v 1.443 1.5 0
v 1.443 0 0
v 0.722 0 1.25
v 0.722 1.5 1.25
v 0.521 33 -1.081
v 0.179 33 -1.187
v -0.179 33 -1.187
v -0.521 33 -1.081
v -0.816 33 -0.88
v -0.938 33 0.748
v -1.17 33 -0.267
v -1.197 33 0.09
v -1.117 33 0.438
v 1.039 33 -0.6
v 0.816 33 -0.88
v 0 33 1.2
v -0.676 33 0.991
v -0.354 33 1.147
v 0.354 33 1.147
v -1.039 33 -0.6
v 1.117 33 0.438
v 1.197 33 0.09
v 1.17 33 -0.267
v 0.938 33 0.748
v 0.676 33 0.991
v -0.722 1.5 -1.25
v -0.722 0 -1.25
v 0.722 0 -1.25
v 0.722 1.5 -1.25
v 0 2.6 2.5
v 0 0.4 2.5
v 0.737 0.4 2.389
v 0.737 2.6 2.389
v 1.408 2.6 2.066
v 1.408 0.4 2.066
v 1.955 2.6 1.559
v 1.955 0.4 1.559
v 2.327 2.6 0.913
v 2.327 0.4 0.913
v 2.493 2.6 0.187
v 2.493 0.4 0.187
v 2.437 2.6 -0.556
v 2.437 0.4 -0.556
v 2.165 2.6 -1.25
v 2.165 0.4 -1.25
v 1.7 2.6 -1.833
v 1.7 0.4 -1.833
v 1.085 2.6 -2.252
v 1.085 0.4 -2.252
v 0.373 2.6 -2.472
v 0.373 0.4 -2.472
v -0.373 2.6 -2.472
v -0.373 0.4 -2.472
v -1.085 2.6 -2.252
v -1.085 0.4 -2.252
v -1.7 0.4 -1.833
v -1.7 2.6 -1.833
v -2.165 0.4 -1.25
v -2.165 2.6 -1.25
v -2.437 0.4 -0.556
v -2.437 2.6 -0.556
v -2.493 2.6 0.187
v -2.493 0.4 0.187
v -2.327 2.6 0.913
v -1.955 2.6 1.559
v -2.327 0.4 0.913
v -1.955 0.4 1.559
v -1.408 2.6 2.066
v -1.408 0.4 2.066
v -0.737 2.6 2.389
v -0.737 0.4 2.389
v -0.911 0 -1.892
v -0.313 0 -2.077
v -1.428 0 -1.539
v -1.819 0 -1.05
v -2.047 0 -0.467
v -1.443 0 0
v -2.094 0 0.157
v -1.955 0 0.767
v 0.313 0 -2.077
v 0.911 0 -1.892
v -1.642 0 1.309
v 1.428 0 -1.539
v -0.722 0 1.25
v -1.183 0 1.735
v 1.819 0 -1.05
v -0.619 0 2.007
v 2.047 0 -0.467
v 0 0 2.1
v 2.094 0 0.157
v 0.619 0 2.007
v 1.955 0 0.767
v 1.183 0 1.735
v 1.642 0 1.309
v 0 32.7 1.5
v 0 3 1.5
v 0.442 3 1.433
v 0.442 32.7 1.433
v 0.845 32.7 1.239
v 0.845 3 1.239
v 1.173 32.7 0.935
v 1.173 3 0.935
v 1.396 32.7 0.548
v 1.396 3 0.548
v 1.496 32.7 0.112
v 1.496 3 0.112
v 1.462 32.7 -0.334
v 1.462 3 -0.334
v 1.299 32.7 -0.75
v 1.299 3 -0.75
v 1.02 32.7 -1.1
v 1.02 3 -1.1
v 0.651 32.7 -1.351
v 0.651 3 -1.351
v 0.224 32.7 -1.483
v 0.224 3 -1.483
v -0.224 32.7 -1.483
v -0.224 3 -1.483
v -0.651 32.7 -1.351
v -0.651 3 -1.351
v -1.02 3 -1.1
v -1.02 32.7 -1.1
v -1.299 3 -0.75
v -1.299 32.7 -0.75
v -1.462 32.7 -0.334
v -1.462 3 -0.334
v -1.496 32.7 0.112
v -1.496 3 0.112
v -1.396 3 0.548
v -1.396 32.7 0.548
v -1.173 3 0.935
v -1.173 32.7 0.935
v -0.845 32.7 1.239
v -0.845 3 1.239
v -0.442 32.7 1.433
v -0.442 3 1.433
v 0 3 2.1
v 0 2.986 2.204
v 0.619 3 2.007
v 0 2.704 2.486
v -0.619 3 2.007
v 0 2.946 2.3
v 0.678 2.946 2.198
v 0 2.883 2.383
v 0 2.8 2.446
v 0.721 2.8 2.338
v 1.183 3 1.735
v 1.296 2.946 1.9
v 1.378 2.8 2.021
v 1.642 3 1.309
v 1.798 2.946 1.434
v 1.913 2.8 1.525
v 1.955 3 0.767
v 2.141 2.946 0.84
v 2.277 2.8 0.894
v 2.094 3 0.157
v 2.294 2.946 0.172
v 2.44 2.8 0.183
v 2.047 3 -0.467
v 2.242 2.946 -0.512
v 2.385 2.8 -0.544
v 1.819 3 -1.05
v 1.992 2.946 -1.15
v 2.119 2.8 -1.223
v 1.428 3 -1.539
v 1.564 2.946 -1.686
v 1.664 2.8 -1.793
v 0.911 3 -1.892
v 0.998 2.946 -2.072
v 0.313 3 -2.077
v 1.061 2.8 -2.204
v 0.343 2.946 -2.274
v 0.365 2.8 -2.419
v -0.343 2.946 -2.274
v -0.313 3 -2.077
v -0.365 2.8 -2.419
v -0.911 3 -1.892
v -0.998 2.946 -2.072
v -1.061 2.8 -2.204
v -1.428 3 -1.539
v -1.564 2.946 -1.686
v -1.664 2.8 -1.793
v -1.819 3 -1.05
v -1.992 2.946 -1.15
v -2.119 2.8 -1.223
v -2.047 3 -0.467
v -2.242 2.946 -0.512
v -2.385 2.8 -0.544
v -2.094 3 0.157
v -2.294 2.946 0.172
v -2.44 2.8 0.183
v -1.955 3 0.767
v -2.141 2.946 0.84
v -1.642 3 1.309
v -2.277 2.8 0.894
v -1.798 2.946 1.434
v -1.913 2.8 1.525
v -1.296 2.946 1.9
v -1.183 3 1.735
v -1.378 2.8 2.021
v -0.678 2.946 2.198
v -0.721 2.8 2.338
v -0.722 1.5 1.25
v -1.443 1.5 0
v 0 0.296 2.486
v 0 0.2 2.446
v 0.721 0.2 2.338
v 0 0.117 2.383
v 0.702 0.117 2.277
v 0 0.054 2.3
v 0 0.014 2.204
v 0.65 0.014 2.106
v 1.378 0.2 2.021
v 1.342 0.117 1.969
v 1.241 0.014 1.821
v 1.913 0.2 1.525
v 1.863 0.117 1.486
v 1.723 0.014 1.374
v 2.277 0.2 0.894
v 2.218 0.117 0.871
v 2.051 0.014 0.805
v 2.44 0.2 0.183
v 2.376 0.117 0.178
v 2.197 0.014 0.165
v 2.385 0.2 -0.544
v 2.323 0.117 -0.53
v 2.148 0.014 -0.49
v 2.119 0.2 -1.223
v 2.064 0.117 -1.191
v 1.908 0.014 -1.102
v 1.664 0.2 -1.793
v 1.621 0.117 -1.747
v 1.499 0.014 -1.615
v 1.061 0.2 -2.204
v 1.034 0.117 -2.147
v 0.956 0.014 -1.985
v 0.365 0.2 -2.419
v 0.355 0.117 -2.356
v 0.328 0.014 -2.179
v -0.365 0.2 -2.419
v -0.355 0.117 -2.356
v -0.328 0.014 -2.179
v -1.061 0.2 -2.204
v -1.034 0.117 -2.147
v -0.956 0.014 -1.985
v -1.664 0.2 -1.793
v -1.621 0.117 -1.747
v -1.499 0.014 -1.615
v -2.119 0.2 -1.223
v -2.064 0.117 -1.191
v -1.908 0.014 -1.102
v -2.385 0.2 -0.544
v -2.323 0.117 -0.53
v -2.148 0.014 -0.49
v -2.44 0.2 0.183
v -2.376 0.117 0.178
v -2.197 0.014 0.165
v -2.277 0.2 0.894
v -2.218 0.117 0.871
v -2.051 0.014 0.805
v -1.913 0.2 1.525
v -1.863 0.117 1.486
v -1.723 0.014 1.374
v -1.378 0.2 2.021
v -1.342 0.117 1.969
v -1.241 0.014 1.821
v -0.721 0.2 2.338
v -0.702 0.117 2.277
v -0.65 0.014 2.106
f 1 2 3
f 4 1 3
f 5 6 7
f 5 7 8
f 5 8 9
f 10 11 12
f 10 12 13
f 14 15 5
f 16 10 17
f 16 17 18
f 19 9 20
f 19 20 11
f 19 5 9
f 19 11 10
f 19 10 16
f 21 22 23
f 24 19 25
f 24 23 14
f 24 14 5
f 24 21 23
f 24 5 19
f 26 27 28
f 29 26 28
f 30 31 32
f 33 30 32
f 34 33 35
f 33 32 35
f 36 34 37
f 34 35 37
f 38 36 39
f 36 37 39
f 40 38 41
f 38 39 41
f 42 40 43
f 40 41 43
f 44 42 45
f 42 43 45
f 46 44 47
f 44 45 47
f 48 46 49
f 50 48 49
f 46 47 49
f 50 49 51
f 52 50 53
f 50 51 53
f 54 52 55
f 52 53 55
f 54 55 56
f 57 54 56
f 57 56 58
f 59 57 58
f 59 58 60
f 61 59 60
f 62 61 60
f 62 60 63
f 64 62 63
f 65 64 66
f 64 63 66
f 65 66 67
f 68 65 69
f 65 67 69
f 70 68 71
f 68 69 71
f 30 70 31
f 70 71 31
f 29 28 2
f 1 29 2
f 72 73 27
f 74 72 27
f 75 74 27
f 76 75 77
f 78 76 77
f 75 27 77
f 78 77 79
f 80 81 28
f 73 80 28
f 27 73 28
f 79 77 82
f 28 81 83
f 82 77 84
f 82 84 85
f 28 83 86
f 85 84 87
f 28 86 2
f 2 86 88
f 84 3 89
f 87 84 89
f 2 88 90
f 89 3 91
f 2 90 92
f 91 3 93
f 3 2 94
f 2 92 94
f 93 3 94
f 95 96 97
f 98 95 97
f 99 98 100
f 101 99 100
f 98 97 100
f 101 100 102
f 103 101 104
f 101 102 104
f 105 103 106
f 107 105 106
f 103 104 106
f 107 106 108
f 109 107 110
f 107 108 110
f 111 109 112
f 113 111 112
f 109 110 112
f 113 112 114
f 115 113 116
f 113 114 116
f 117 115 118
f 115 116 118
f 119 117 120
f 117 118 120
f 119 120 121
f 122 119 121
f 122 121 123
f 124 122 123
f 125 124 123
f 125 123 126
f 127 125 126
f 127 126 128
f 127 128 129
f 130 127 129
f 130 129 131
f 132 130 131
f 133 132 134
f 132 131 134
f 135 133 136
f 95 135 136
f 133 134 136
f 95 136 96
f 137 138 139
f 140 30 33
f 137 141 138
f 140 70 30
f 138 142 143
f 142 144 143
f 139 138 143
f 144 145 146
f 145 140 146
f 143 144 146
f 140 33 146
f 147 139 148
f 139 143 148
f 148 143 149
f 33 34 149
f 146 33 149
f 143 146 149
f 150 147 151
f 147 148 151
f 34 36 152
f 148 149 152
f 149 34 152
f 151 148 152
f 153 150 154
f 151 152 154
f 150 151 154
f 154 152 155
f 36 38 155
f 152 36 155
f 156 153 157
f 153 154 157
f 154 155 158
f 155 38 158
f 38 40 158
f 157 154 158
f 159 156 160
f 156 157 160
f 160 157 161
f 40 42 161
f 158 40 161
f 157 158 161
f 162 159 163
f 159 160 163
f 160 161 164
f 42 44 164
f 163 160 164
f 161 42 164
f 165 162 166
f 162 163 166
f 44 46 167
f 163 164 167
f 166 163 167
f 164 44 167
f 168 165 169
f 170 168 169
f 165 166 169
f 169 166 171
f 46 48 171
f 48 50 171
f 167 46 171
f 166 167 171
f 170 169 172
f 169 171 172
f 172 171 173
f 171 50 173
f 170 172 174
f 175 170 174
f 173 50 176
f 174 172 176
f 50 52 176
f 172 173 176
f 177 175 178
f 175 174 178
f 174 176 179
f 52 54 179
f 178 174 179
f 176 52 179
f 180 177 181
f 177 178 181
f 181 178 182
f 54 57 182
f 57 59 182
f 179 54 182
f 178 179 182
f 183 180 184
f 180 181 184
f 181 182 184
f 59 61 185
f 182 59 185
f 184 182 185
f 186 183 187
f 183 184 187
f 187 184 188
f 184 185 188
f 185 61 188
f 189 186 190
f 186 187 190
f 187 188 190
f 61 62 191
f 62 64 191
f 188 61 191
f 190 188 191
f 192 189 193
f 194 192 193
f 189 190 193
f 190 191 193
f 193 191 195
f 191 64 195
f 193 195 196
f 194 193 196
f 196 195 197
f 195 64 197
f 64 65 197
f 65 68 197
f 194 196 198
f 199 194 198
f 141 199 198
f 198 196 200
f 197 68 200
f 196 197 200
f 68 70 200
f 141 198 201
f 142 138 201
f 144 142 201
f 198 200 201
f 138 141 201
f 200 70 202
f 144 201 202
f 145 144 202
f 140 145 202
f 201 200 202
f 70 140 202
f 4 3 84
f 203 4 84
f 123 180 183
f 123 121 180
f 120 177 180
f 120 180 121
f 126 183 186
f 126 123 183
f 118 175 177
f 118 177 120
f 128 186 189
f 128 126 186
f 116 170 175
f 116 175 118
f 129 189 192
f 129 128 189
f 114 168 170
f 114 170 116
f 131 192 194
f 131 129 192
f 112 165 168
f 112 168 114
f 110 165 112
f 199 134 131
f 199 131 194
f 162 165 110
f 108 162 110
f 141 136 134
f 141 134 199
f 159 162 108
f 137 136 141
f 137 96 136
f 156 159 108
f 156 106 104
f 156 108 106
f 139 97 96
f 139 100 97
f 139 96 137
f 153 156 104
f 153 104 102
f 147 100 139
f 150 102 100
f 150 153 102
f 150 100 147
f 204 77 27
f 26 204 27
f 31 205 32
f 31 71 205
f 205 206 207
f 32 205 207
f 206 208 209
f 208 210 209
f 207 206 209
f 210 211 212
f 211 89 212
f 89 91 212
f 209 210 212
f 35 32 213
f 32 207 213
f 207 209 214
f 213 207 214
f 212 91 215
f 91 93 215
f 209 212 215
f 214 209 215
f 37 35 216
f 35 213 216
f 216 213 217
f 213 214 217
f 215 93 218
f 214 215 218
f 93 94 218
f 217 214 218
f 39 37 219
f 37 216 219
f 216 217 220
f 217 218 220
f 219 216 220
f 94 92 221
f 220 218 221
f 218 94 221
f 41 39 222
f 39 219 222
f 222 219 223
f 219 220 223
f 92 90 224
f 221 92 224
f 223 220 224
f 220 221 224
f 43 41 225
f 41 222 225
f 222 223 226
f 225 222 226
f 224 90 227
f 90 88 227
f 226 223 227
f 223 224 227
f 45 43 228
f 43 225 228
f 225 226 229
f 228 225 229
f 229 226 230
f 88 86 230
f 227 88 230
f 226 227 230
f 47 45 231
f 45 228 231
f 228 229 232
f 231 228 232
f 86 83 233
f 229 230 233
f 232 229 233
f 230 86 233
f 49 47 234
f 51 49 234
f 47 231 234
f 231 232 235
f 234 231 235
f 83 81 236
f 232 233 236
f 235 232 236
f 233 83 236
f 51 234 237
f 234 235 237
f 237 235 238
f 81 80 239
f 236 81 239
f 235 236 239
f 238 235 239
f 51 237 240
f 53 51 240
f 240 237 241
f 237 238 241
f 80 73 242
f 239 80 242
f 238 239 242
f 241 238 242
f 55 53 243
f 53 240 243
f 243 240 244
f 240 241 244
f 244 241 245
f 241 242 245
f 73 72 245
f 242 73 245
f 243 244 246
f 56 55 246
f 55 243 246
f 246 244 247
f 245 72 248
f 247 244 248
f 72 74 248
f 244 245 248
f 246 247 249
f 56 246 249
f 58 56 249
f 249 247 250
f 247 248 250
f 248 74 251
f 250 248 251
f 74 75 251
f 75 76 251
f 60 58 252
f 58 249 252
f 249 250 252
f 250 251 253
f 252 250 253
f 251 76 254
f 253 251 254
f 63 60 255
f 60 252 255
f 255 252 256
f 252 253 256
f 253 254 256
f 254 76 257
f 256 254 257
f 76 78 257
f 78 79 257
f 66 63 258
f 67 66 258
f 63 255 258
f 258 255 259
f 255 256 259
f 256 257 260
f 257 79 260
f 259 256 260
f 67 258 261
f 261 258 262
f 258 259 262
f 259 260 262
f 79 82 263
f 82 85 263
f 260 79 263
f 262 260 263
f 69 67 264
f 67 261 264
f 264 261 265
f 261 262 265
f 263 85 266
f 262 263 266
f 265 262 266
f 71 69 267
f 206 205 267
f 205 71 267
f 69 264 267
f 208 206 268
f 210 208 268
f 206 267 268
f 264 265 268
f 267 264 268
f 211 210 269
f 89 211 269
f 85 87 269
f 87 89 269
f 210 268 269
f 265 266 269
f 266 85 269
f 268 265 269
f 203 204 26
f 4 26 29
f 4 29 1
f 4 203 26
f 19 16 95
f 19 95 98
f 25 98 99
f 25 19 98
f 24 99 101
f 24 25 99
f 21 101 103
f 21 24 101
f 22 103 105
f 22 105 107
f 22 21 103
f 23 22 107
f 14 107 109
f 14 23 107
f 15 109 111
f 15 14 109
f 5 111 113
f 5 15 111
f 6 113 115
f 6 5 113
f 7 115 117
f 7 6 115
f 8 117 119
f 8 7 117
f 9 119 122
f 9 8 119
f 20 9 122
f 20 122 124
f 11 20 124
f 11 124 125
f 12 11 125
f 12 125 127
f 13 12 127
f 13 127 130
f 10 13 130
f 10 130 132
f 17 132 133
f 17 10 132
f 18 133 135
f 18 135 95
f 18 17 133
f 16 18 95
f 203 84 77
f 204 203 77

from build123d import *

# Parameters (mm, degrees)
SKETCH1_R           = 2.5
BOSS_EXTRUDE1_DEPTH = 3
SKETCH2_R           = 1.5
BOSS_EXTRUDE2_DEPTH = 30
CHAMFER1_SIZE       = 0.3
FILLET1_R           = 0.4
CUT_EXTRUDE1_DEPTH  = 1.5


with BuildPart() as part:
    # Sketch1 → Boss-Extrude1 (new body)
    with BuildSketch(Plane(origin=(0, 0, 0), x_dir=(1, 0, 0), z_dir=(0, 1, 0))):
        with Locations(Location((0, 0, 0), (0, 0, 270))):
            Circle(SKETCH1_R)
    extrude(amount=BOSS_EXTRUDE1_DEPTH)

    # Sketch2 → Boss-Extrude2 (add)
    with BuildSketch(Plane(origin=(0, 3, 0), x_dir=(1, 0, 0), z_dir=(0, 1, 0))):
        with Locations(Location((0, 0, 0), (0, 0, 270))):
            Circle(SKETCH2_R)
    extrude(amount=BOSS_EXTRUDE2_DEPTH)

    # Chamfer1
    chamfer1_edges = [part.edges().sort_by_distance(p)[0] for p in [
        (0, 33, -1.5),
    ]]
    chamfer(chamfer1_edges, length=CHAMFER1_SIZE)

    # Fillet1
    fillet1_edges = [part.edges().sort_by_distance(p)[0] for p in [
        (0, 0, -2.5),
        (0, 3, -2.5),
    ]]
    fillet(fillet1_edges, radius=FILLET1_R)

    # Sketch3 → Cut-Extrude1 (cut)
    with BuildSketch(Plane.XZ):
        Polygon((1.443375673, 0), (0.721687836, 1.25), (-0.721687836, 1.25), (-1.443375673, 0), (-0.721687836, -1.25), (0.721687836, -1.25), align=None)
    extrude(amount=-CUT_EXTRUDE1_DEPTH, mode=Mode.SUBTRACT)


solid = part.part
